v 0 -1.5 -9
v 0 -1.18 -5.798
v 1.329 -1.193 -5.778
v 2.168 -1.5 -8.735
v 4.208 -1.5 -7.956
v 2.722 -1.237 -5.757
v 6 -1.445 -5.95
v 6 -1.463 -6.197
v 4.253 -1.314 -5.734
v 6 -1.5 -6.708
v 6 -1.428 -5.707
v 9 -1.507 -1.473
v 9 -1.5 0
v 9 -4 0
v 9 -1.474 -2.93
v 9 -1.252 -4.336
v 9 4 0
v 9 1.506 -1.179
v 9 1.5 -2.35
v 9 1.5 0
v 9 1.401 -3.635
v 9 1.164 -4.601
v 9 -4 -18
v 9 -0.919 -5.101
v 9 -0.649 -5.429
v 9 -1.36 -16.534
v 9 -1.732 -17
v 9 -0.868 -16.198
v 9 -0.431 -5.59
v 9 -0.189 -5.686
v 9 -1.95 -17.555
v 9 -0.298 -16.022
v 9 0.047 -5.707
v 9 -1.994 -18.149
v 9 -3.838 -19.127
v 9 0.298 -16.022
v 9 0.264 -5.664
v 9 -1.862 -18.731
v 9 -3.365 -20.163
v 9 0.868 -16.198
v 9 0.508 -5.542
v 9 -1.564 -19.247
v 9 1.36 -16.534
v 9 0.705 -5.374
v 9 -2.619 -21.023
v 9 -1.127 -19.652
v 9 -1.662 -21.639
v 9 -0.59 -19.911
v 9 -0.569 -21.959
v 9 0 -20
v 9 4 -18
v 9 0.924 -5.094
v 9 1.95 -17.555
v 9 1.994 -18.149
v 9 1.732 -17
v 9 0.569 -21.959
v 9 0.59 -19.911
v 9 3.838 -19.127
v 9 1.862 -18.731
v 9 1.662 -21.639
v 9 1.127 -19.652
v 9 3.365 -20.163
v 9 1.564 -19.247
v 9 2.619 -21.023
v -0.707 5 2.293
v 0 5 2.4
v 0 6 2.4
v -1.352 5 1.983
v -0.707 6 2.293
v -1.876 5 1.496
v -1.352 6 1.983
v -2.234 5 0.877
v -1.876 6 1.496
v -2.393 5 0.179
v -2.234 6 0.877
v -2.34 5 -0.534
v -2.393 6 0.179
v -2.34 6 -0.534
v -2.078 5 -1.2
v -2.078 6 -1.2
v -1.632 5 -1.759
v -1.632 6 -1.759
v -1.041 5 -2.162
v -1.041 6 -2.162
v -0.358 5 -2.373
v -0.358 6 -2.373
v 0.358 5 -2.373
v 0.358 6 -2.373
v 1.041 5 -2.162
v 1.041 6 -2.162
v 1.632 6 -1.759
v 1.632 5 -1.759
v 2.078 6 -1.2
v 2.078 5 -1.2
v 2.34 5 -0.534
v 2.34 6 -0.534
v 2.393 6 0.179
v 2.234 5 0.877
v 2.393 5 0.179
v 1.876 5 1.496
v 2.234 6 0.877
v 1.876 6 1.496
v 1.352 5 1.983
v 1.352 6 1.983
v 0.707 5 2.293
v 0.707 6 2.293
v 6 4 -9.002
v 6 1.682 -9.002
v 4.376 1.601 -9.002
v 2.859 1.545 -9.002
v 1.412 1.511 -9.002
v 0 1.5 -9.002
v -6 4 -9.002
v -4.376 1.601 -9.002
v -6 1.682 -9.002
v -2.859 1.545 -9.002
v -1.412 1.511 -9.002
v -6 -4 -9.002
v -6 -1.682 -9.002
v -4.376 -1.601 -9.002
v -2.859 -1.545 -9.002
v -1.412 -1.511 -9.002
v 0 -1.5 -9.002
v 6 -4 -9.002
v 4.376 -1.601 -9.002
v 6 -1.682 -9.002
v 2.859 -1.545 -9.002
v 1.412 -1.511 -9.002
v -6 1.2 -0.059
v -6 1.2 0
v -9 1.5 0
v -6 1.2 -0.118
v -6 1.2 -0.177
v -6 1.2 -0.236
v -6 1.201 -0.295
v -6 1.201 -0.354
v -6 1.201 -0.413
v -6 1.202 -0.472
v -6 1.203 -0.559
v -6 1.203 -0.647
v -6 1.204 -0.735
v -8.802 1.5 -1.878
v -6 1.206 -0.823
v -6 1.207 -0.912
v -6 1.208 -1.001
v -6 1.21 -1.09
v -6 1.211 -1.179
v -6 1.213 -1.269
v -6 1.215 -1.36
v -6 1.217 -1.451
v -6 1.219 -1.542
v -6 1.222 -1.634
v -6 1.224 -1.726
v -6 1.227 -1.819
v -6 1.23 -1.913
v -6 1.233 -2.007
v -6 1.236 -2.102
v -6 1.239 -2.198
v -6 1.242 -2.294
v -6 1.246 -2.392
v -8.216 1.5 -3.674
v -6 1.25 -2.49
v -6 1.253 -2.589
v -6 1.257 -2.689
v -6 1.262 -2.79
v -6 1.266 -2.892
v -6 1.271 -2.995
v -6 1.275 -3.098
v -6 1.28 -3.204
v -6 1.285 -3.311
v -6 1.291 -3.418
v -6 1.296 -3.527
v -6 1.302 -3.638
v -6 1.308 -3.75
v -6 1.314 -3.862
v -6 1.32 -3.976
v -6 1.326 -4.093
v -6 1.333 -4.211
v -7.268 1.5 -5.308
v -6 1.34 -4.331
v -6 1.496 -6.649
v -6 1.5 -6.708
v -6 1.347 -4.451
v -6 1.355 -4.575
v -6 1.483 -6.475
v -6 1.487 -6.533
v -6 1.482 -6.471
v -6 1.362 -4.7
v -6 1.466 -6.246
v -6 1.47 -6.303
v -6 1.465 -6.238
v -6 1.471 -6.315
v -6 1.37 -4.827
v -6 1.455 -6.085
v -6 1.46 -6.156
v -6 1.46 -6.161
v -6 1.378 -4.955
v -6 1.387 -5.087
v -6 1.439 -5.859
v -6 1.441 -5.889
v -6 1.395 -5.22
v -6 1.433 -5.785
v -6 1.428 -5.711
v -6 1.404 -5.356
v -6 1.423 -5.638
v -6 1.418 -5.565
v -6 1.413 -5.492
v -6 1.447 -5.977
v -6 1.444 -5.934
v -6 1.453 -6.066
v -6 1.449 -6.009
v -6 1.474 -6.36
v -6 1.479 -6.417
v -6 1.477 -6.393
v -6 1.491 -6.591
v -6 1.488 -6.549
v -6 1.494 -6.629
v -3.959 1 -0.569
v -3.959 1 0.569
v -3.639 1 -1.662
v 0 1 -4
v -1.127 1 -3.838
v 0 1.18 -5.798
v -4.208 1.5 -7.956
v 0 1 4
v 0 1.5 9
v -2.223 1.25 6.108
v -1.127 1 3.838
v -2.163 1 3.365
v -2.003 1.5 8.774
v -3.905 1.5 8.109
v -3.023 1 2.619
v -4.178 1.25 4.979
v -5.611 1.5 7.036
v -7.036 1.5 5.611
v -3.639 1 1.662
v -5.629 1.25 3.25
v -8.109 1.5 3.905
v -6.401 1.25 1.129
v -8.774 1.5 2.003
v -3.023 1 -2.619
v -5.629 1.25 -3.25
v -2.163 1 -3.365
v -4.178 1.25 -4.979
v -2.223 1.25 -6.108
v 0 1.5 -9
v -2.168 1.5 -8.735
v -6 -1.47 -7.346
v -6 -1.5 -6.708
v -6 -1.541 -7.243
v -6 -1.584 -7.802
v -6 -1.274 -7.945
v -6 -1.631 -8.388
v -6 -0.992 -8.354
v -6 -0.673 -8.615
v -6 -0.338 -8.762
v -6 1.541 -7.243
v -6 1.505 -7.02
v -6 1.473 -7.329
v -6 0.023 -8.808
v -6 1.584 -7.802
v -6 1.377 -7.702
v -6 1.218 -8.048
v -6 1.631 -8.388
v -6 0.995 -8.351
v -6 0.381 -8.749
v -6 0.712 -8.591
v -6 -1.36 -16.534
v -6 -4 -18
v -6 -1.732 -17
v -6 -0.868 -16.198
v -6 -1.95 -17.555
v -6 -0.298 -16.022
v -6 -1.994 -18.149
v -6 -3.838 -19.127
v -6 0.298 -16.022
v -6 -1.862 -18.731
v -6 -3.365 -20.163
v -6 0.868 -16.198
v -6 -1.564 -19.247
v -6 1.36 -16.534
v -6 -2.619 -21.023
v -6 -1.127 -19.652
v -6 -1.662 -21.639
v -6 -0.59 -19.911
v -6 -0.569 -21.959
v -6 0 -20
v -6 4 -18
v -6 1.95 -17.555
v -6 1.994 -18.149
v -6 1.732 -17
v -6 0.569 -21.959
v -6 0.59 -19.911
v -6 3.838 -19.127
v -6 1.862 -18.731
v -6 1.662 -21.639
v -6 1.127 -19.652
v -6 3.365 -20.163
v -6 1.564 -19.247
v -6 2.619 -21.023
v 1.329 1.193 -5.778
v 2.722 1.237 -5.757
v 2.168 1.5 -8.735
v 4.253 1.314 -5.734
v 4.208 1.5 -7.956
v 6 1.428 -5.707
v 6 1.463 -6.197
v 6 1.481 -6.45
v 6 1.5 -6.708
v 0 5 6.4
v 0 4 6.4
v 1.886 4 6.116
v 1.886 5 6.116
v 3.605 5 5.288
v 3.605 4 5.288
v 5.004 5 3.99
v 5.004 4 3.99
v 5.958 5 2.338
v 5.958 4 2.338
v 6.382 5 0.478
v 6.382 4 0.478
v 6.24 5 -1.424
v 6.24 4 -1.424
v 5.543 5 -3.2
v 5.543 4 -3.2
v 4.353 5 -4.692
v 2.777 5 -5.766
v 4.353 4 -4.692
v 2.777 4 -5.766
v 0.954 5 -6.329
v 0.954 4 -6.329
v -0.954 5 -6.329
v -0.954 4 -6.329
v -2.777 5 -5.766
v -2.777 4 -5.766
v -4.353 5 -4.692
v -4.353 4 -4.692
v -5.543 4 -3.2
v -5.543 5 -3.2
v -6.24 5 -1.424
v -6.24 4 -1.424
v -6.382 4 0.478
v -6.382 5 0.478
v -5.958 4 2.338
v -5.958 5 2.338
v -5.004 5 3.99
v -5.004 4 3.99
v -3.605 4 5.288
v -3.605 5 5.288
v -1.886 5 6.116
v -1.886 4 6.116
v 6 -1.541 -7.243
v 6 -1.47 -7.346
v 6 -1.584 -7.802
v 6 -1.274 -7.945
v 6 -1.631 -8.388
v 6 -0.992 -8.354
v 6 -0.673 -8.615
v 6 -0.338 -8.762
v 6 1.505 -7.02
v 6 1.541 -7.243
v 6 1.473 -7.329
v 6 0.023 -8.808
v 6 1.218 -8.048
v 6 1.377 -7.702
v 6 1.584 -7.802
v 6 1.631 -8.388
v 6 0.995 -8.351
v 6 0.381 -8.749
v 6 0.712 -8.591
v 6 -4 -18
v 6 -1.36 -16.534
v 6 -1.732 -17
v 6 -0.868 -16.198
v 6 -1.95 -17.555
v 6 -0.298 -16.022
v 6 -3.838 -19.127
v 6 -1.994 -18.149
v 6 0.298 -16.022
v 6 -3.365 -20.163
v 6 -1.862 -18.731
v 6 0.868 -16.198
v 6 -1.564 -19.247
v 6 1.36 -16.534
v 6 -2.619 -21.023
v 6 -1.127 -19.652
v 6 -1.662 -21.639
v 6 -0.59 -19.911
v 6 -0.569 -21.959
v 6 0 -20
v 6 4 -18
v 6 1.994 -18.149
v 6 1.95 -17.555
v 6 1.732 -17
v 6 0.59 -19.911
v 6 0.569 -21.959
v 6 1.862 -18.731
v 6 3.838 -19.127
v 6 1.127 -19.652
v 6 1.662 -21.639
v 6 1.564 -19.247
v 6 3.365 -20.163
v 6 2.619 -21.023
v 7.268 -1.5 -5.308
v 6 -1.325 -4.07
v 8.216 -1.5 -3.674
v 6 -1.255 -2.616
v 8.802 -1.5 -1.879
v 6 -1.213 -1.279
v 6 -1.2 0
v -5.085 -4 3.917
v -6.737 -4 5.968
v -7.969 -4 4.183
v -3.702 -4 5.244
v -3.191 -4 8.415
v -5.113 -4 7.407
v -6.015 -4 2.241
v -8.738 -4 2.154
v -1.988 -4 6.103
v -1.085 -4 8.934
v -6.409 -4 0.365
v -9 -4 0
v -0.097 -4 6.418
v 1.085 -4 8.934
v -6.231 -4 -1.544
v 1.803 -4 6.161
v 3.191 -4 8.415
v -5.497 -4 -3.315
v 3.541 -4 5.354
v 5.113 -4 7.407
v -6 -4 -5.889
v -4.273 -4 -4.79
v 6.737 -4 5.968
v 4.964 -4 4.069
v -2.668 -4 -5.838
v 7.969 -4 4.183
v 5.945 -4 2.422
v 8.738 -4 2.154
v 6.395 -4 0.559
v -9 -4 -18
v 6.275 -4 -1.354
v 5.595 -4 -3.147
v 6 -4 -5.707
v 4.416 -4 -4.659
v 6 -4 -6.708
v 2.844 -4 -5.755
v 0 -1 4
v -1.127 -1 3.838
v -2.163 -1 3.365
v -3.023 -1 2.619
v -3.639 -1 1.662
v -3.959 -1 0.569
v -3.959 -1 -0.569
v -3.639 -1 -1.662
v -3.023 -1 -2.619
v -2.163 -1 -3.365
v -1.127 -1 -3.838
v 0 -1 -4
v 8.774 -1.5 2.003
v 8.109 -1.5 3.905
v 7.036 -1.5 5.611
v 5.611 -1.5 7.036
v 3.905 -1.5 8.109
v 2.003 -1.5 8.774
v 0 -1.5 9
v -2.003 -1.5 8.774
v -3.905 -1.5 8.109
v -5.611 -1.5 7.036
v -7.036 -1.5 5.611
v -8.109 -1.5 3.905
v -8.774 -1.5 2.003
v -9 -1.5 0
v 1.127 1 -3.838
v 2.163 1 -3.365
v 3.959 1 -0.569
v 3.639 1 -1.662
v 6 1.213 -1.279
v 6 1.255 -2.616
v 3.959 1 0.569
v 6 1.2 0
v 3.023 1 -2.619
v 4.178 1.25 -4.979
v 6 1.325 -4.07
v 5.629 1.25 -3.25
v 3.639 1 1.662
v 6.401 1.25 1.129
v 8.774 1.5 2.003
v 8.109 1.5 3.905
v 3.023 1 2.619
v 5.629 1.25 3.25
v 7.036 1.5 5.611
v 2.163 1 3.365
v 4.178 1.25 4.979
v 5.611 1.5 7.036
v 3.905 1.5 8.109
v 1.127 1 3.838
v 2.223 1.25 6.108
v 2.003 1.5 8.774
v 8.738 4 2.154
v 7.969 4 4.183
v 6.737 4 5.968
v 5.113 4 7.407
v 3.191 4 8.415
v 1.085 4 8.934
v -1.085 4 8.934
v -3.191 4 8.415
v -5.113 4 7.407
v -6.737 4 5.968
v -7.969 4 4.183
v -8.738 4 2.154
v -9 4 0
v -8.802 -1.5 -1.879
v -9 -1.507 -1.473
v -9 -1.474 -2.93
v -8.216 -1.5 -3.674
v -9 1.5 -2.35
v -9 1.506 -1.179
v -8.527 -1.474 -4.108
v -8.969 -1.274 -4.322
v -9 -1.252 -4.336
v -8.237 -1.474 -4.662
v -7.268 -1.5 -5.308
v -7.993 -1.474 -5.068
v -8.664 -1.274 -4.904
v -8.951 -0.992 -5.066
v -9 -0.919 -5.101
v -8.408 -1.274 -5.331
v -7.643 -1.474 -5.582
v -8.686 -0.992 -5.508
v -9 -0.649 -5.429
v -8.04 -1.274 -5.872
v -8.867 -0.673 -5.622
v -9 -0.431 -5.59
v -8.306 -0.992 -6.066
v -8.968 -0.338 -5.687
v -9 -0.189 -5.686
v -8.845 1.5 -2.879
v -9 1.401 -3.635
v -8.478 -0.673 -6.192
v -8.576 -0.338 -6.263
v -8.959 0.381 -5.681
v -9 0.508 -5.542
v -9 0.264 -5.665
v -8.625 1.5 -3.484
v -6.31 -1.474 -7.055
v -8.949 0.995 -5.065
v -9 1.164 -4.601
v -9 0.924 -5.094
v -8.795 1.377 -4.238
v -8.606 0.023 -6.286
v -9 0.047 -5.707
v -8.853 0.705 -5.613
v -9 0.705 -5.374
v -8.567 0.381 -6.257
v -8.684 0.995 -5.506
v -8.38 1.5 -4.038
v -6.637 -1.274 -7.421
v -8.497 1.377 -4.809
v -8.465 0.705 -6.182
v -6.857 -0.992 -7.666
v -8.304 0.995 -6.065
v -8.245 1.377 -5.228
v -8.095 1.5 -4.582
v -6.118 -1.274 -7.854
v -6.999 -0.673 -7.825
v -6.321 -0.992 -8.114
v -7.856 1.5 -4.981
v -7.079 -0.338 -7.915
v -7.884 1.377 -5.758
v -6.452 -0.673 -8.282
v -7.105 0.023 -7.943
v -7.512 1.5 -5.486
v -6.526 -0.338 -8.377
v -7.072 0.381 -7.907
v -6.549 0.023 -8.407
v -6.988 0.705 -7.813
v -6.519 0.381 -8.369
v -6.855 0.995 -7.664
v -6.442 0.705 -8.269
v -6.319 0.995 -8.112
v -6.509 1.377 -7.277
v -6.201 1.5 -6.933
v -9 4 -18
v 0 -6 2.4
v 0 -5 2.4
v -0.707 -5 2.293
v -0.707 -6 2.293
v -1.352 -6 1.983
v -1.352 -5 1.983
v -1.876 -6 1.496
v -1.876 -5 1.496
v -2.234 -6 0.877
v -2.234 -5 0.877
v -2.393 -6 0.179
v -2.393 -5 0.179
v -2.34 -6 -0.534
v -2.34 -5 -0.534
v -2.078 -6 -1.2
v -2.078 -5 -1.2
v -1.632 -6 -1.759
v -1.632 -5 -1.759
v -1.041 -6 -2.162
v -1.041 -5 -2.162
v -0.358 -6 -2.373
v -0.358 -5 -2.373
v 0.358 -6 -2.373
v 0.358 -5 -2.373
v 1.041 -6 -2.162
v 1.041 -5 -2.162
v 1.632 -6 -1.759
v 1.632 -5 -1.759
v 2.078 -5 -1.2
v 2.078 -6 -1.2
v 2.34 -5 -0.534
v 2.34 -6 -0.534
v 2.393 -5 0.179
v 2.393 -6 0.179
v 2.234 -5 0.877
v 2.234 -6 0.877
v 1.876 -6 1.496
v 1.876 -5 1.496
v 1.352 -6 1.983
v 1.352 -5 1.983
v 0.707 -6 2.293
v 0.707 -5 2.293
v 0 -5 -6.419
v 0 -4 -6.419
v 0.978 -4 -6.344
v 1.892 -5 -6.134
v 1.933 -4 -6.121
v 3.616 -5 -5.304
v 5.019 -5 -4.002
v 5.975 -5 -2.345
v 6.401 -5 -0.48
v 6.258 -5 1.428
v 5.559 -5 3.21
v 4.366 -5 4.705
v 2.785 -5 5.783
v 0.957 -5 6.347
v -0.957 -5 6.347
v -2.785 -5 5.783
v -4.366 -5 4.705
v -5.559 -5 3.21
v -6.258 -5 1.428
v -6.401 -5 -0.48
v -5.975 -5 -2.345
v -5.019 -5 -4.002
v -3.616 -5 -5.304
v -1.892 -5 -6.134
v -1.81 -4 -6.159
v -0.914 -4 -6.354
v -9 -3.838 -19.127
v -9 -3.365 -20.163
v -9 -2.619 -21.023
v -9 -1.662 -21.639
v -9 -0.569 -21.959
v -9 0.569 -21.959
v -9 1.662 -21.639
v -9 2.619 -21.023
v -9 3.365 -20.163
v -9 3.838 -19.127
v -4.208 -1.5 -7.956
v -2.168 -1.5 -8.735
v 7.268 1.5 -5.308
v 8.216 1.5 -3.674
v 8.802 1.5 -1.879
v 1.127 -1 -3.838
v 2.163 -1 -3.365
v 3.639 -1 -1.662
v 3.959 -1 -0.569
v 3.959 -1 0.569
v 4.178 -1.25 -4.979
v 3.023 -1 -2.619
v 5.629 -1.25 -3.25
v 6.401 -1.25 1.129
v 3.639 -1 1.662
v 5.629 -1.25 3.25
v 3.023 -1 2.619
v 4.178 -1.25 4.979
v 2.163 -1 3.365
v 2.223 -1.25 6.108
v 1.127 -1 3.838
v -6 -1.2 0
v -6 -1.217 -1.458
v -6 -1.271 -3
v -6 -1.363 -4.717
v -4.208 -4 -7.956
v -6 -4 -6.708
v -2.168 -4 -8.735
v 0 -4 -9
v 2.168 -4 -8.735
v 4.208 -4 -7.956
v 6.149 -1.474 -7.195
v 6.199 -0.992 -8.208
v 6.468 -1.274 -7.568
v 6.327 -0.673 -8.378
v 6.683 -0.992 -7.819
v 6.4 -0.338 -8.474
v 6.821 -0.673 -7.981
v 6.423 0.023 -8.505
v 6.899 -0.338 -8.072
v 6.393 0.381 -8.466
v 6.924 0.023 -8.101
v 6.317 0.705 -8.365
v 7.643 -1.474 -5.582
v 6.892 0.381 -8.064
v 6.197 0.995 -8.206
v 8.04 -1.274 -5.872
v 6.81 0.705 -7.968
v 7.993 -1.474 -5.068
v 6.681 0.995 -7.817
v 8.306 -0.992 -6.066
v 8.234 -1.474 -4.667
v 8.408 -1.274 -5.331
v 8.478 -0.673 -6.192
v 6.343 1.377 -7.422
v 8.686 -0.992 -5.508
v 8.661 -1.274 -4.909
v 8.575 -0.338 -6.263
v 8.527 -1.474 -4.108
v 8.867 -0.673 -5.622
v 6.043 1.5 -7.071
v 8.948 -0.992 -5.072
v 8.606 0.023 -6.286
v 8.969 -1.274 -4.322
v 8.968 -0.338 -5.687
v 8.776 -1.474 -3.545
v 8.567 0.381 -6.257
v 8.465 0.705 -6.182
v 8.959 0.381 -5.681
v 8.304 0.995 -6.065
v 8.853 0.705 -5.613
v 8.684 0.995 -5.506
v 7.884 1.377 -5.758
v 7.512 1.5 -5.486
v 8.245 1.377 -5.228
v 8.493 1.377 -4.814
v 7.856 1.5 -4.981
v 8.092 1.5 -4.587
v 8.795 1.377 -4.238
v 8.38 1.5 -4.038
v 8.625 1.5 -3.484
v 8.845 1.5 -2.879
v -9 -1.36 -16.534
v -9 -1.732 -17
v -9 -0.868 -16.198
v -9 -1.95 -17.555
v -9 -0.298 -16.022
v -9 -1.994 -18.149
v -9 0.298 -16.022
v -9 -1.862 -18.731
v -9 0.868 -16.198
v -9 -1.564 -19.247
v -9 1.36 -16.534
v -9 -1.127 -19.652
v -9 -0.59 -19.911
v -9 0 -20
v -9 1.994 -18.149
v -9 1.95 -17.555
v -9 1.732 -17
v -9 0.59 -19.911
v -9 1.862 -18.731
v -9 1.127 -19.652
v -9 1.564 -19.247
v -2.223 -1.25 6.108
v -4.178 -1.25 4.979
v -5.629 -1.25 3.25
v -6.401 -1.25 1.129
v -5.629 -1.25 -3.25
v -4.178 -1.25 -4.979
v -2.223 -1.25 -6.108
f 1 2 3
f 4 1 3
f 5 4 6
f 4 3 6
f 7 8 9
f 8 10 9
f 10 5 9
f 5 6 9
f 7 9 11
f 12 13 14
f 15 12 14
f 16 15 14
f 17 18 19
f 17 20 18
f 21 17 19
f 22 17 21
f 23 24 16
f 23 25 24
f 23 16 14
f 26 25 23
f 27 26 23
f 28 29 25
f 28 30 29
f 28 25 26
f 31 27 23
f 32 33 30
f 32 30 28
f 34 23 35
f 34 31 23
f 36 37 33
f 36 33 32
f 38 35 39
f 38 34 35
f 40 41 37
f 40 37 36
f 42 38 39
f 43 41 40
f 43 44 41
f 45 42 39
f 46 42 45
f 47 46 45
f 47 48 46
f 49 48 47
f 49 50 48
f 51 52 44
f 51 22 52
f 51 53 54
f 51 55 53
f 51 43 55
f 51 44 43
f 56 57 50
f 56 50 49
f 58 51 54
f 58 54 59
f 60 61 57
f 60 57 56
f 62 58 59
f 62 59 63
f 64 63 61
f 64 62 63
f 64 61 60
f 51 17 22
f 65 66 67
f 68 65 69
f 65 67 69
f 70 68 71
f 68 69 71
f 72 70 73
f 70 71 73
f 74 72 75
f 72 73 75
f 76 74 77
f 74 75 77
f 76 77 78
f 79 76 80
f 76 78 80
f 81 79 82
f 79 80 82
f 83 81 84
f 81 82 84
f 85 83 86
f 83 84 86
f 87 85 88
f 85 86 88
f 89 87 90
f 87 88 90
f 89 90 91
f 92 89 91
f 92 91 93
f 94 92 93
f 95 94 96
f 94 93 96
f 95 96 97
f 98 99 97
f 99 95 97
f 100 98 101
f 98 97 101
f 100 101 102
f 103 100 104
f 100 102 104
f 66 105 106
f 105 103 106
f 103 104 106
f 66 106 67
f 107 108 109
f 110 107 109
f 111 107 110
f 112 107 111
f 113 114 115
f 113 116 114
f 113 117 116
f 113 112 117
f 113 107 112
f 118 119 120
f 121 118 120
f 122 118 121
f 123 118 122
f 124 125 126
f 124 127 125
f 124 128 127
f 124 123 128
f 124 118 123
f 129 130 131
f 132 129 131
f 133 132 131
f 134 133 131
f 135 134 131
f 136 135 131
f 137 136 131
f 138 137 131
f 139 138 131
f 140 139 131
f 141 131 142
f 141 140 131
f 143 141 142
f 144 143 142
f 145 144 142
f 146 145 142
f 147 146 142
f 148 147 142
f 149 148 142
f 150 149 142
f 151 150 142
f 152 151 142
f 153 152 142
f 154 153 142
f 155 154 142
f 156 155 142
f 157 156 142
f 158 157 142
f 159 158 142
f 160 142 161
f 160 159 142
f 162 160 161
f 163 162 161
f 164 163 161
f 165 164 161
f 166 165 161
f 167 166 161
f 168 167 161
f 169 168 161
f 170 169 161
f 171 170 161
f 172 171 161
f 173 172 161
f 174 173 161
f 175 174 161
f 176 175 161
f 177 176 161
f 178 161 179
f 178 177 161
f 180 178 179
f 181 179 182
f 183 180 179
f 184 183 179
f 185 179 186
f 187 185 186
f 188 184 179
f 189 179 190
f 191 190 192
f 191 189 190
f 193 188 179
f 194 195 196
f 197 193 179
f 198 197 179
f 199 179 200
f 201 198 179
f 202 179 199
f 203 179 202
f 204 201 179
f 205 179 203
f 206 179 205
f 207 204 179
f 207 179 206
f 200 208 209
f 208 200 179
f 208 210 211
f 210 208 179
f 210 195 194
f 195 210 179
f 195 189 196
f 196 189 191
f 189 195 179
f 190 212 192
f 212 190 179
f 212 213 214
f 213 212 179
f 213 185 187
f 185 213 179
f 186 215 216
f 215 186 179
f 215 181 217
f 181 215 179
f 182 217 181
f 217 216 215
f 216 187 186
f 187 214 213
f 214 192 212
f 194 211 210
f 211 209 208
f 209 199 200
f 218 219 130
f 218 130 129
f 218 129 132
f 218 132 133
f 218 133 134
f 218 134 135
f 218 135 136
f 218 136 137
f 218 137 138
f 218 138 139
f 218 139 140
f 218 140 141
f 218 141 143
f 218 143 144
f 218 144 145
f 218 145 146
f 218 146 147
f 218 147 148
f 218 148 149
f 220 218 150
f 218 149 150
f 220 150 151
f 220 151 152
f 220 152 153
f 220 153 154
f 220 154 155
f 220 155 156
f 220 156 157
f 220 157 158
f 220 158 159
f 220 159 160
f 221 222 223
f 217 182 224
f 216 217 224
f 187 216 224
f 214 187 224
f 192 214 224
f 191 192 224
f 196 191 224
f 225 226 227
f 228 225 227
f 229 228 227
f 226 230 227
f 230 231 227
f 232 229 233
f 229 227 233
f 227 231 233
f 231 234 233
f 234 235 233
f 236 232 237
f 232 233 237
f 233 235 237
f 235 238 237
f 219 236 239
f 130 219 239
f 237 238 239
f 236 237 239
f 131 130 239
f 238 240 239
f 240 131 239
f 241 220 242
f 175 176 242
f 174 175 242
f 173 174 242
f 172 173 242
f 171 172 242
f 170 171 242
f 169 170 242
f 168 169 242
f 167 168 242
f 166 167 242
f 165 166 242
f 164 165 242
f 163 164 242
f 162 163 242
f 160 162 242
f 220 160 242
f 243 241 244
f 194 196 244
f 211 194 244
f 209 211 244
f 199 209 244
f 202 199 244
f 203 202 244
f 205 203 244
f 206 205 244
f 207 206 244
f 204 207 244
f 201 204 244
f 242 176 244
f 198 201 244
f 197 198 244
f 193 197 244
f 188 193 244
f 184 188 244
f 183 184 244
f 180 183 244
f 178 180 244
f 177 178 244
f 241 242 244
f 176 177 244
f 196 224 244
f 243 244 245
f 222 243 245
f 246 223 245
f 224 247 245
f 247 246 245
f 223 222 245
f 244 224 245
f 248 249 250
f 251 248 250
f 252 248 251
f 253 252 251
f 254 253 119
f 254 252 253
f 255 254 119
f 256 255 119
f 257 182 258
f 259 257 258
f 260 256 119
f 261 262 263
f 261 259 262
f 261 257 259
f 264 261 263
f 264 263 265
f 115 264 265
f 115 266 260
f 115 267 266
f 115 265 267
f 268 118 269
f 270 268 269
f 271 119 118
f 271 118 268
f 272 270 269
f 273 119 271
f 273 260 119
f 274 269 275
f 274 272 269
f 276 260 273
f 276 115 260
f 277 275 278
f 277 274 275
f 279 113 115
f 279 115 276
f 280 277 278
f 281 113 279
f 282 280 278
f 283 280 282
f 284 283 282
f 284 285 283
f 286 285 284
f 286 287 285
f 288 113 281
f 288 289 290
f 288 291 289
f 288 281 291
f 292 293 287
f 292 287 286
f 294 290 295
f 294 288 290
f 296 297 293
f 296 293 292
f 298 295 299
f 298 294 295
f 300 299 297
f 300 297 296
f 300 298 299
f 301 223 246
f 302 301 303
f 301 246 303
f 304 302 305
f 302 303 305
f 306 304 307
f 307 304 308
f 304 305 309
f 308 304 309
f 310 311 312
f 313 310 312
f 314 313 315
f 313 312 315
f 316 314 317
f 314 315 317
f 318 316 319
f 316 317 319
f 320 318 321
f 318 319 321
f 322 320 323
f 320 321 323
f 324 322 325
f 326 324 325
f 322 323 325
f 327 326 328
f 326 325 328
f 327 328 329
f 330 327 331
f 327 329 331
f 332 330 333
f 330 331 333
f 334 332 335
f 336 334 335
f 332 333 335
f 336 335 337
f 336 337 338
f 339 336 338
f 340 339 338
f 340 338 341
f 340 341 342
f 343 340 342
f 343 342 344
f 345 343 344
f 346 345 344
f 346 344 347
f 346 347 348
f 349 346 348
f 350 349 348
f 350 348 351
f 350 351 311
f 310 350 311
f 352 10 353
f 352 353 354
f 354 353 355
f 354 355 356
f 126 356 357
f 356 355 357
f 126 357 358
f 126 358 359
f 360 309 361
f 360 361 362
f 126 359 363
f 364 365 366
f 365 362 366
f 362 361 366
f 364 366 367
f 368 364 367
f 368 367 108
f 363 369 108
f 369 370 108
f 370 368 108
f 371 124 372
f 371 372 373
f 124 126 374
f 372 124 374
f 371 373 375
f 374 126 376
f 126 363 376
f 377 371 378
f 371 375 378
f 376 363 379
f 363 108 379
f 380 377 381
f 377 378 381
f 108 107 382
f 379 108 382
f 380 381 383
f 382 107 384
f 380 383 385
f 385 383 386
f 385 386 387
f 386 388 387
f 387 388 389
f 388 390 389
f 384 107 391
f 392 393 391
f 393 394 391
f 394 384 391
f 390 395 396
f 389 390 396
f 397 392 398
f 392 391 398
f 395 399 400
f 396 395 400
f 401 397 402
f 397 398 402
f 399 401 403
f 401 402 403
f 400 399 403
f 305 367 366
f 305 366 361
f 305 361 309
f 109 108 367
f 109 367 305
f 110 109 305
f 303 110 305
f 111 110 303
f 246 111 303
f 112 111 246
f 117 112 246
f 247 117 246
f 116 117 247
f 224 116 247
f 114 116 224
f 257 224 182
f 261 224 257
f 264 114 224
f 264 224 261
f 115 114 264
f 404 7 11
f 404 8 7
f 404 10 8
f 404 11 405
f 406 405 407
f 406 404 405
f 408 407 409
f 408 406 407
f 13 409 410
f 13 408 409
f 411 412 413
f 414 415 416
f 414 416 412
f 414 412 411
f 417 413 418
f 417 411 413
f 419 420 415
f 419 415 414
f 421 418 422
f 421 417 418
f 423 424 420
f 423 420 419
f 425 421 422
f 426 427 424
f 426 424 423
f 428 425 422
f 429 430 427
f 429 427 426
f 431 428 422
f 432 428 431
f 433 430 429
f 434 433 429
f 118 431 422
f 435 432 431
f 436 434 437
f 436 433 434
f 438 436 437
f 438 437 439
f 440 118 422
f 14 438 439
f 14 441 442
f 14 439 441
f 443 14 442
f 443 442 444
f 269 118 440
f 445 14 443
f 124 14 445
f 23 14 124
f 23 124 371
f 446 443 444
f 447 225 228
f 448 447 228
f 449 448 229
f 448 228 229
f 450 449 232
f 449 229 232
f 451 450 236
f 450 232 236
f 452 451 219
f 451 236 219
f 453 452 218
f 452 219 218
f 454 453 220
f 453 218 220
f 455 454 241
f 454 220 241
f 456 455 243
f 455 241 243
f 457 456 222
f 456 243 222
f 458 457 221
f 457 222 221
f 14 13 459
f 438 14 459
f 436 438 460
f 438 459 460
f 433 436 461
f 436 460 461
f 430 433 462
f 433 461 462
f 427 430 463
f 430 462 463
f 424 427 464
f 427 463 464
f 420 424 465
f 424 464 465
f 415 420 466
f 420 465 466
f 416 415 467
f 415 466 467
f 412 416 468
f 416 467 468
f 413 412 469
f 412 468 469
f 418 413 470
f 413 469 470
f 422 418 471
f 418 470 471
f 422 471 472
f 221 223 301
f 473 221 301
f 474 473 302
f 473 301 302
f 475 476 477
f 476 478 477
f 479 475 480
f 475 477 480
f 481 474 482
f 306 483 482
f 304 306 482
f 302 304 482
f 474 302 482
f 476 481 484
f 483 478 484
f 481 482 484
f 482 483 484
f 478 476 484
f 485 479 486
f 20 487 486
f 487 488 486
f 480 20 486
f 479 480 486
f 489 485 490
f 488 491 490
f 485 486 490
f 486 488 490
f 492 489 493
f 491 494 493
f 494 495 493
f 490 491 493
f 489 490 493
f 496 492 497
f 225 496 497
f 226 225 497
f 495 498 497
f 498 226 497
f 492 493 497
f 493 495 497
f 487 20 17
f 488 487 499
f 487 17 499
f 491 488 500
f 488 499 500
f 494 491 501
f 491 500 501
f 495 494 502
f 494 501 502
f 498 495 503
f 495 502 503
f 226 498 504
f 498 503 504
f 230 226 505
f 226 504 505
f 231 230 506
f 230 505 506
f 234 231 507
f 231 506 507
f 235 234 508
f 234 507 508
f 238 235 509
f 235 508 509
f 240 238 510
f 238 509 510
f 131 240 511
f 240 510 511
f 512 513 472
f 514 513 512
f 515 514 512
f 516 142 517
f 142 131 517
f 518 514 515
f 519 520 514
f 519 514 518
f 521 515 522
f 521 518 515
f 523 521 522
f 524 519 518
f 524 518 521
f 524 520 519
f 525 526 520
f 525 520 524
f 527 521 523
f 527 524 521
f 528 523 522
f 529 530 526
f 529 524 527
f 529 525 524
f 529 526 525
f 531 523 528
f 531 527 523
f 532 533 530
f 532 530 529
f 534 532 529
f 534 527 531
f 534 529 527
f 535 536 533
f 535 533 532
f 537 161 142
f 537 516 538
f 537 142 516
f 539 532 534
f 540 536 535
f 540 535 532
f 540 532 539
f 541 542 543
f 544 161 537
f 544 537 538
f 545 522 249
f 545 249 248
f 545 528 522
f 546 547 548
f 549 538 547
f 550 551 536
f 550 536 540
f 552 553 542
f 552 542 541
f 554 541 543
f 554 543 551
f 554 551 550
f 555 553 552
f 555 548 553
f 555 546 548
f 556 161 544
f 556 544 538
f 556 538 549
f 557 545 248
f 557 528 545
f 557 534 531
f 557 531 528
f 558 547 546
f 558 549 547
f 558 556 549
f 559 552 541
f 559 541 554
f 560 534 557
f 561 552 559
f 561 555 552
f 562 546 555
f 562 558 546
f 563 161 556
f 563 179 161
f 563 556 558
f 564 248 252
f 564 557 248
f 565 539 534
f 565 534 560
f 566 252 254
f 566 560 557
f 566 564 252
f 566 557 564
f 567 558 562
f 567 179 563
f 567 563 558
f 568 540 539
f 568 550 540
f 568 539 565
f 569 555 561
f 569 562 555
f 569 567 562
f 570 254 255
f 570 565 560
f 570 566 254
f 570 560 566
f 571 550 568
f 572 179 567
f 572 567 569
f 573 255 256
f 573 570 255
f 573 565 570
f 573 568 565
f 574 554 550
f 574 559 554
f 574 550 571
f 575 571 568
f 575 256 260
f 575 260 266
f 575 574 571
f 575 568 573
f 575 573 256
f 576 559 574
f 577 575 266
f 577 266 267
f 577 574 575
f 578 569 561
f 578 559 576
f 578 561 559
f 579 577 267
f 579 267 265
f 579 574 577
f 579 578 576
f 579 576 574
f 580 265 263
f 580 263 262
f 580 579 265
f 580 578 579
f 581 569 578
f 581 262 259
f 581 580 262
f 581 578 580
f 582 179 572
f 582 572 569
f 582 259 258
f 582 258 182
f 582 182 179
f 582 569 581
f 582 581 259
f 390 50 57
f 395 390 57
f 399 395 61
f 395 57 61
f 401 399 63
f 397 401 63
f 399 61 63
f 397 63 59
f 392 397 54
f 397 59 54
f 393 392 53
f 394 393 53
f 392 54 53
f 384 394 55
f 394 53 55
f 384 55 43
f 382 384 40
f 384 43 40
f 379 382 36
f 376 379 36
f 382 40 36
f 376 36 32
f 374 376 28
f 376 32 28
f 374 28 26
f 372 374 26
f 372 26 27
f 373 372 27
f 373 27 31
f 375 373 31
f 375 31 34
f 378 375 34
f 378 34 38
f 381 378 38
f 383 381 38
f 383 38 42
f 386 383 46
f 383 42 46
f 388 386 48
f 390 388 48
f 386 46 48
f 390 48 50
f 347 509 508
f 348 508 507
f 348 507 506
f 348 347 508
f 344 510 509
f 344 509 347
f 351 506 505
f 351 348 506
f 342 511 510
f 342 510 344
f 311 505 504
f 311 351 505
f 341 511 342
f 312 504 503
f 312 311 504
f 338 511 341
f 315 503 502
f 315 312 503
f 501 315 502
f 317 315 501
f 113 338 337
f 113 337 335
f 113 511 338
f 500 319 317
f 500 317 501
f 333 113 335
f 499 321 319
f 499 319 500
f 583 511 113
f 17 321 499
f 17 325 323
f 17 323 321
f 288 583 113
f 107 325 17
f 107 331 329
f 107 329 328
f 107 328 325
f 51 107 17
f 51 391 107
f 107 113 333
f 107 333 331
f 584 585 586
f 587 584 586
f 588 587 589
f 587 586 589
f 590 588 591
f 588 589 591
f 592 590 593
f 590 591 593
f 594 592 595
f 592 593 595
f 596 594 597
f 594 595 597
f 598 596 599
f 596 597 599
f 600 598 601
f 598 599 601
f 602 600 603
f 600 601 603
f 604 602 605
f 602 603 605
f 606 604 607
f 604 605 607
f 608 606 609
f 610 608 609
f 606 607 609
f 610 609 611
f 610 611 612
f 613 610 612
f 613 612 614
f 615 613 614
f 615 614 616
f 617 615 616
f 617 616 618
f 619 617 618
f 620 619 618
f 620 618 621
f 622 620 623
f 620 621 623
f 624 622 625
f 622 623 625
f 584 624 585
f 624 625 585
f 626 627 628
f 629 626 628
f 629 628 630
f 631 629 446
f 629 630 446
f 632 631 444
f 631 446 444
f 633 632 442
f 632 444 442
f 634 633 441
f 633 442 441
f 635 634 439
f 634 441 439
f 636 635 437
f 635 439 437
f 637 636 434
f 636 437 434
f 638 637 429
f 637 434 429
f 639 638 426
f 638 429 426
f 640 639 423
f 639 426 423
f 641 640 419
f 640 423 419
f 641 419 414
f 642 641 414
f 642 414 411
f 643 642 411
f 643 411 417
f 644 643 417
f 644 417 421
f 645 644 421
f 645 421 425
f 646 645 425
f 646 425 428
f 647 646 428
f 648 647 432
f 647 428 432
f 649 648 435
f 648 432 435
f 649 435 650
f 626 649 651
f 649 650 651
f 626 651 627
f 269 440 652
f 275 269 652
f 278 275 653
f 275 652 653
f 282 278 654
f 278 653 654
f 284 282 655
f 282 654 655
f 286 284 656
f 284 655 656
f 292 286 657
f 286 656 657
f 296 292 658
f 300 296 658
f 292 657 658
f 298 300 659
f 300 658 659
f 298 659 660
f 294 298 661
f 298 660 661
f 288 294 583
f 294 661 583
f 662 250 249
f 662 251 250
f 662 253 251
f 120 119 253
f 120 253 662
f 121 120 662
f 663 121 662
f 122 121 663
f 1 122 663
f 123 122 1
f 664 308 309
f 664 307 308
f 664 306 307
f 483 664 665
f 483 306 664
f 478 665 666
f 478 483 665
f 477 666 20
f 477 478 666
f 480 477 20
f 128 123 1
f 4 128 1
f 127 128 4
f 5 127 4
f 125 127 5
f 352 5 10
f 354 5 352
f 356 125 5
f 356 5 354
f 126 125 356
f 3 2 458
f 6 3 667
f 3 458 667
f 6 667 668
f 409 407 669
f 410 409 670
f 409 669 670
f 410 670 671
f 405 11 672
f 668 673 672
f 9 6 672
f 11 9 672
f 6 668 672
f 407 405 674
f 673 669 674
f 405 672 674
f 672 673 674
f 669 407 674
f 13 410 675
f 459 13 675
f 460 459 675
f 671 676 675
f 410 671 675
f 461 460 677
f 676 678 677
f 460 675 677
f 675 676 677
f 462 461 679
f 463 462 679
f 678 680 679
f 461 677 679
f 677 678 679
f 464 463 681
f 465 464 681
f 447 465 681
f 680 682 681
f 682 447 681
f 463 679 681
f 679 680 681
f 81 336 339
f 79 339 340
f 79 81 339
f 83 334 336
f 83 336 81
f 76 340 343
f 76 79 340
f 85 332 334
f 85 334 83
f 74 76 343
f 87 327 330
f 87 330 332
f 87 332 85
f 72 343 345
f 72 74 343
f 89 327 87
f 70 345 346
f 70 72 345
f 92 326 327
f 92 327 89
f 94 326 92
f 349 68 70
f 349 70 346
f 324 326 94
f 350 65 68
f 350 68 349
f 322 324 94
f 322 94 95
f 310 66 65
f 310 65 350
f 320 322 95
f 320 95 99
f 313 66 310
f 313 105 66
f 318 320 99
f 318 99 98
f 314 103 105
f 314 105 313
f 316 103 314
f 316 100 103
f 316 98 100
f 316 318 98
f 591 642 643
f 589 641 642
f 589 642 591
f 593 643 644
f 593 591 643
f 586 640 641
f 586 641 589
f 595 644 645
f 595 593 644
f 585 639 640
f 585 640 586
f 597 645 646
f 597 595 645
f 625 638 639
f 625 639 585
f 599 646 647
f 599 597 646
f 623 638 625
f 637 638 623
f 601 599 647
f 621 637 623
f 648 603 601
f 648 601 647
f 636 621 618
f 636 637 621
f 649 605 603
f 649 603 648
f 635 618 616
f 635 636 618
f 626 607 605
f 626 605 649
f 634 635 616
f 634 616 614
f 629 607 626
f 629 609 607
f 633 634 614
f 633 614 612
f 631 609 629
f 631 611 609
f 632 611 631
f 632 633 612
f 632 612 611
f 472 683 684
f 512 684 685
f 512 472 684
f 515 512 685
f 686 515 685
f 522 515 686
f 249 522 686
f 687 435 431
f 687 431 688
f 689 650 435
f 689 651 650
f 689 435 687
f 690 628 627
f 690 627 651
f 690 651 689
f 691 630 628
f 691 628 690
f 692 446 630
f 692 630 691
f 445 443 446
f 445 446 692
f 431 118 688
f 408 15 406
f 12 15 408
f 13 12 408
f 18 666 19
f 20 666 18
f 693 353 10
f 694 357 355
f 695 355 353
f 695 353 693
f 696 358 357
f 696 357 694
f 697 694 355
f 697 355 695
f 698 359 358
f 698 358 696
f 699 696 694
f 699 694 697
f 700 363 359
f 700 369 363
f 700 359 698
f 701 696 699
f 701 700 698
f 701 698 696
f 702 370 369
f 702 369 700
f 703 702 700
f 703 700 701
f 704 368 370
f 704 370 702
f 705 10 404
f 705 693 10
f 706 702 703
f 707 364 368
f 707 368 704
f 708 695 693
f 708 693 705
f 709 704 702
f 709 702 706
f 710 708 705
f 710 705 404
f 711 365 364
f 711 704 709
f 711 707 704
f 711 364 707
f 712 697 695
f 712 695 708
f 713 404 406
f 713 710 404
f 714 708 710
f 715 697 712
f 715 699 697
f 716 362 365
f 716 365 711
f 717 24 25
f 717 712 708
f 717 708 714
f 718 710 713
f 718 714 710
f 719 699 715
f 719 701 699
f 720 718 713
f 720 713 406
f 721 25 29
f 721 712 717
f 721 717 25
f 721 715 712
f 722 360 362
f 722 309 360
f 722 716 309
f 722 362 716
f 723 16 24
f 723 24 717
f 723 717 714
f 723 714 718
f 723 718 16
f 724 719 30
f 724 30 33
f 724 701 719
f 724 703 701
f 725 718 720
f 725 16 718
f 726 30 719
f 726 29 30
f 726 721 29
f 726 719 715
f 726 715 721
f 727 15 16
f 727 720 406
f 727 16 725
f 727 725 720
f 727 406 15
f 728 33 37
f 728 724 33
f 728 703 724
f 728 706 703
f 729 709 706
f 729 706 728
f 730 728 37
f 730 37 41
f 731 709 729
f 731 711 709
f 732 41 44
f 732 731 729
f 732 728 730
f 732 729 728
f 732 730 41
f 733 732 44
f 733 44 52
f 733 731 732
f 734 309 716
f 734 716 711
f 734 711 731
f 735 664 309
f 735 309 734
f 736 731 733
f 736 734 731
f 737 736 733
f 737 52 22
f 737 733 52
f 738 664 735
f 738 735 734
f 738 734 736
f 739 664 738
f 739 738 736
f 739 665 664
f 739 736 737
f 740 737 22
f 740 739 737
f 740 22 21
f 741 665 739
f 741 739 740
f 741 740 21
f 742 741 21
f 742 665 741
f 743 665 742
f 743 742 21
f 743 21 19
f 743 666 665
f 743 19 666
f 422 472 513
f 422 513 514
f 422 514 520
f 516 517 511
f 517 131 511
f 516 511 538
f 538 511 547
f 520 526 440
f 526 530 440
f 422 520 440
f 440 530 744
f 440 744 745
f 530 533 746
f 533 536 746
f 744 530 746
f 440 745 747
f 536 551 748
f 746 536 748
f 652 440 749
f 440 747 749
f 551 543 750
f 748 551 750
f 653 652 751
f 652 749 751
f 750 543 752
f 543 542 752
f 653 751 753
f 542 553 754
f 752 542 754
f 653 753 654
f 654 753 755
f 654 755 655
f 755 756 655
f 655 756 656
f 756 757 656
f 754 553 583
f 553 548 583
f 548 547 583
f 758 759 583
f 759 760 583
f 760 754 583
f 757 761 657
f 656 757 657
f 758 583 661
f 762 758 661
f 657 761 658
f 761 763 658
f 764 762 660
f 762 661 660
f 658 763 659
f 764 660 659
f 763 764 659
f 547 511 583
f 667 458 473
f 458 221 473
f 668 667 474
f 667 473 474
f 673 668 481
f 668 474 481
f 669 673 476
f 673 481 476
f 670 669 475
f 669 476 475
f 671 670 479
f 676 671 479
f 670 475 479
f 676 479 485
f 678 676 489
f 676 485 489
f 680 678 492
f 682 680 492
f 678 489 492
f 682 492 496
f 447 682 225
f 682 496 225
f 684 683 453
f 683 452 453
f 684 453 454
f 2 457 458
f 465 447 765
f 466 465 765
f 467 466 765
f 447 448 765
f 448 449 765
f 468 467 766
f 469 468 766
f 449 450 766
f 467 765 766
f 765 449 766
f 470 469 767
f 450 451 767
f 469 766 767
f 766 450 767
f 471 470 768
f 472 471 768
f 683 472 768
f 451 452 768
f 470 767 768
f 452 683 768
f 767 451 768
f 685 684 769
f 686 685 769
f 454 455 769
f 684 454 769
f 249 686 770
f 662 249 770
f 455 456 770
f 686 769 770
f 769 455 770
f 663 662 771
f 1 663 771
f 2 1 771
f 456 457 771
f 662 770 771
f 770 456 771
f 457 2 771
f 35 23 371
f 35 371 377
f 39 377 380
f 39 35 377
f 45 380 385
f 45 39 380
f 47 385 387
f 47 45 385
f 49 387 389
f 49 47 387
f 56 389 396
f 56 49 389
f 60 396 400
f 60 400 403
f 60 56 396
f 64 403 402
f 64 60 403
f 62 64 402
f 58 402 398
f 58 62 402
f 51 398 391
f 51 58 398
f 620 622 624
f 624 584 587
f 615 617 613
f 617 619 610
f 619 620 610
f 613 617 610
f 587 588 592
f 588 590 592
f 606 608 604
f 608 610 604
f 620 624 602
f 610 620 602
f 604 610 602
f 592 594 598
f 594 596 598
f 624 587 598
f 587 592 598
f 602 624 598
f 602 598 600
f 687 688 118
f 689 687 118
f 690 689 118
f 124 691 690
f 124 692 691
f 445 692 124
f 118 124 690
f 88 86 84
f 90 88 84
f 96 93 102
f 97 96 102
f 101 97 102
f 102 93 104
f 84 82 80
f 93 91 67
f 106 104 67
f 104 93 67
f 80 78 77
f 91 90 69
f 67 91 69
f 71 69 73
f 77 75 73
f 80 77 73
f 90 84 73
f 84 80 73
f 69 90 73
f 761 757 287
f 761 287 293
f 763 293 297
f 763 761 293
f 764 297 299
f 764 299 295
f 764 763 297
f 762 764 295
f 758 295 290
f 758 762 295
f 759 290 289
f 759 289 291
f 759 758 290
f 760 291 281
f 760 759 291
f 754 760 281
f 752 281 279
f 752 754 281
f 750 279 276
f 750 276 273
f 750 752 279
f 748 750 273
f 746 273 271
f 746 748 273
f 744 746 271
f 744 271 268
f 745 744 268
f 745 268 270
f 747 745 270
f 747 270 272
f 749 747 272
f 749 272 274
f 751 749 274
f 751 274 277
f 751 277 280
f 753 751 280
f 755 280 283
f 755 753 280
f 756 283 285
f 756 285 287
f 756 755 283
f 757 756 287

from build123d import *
from build123d.topology import SkipClean

# Parameters (mm, degrees)
SKETCH4_R            = 6.4
SKETCH4_R_2          = 2
BOSS_EXTRUDE3_DEPTH  = 1
BOSS_EXTRUDE6_START  = -3
SKETCH5_R            = 2
BOSS_EXTRUDE6_DEPTH  = 3.0001
BOSS_EXTRUDE22_REACH = 27.788
SKETCH9_R            = 6.419042014
BOSS_EXTRUDE9_DEPTH  = 1
BOSS_EXTRUDE23_REACH = 27.788


with BuildPart() as part:
    # Sketch3 → Revolve1 (revolve)
    with BuildSketch(Plane(origin=(0, 0, 0), x_dir=(0, 0, -1), z_dir=(1, 0, 0))):
        Polygon((-9, -1.5), (-4, -1), (-4, 1), (-9, 1.5), (-9, 4), (-2.4, 4), (-2.4, 6), (0, 6), (0, -6), (-2.4, -6), (-2.4, -4), (-9, -4), align=None)
    revolve(axis=Axis((0, 6, 0), (0, -1, 0)))



with BuildPart() as body_2:
    # Sketch4 → Boss-Extrude3 (new body)
    with BuildSketch(Plane(origin=(0, 4, 0), x_dir=(1, 0, 0), z_dir=(0, 1, 0))):
        with Locations(Location((0, 0, 0), (0, 0, 270))):
            Circle(SKETCH4_R)
        with Locations(Location((0, 0, 0), (0, 0, 270))):
            Circle(SKETCH4_R_2, mode=Mode.SUBTRACT)
    extrude(amount=BOSS_EXTRUDE3_DEPTH)


with BuildPart() as part_1:
    add(part.part)

    add(body_2.part)  # Boss-Extrude6 merges body 2
    # Sketch5 → Boss-Extrude6 (add)
    with BuildSketch(Plane(origin=(-6, 0, 3.854187267), x_dir=(0, 0, -1), z_dir=(1, 0, 0)).offset(BOSS_EXTRUDE6_START)):
        with BuildLine():
            ThreePointArc((21.854187267, -4), (25.854187267, 0), (21.854187267, 4))
            Line((21.854187267, 4), (3.854187267, 4))
            Line((3.854187267, 4), (3.854187267, -4))
            Line((3.854187267, -4), (21.854187267, -4))
        make_face()
        with Locations((21.854187267, 0)):
            Circle(SKETCH5_R, mode=Mode.SUBTRACT)
    boss_extrude6 = extrude(amount=BOSS_EXTRUDE6_DEPTH)

    # Mirror1: Boss-Extrude6 across plane
    add(boss_extrude6.mirror(Plane(origin=(0, 0, 0), x_dir=(0, 0, 1), z_dir=(1, 0, 0))))

    # Boss-Extrude22: up to this cone (the profile starts inside it)
    with SkipClean():  # the faces are left unmerged after this step: merging them gives an invalid solid
        boss_extrude22_end = Plane(origin=(0, -4, 0), z_dir=(0, -1, 0)).offset(-3.399999) * Cone(1e-05, 656.88, 65.687999, align=(Align.CENTER, Align.CENTER, Align.MIN), mode=Mode.PRIVATE)
        # Sketch18 → Boss-Extrude22 (add, up to the surface)
        with BuildSketch(Plane.XZ.offset(4), mode=Mode.PRIVATE) as boss_extrude22_sk1:
            Polygon((-6, -9.001972309), (5.9999, -9.001972309), (5.9999, -5.707140078), (-6, -5.888545051), align=None)
        boss_extrude22_tool1 = extrude(boss_extrude22_sk1.sketch, amount=-BOSS_EXTRUDE22_REACH, mode=Mode.PRIVATE) & boss_extrude22_end
        add(boss_extrude22_tool1.solids().sort_by_distance((0.056566, -4, -7.39948))[0])

    # Sketch9 → Boss-Extrude9 (add)
    with SkipClean():  # the faces are left unmerged after this step: merging them gives an invalid solid
        with BuildSketch(Plane(origin=(0, -4, 0), x_dir=(-1, 0, 0), z_dir=(0, -1, 0))):
            with Locations(Location((0, 0, 0), (0, 0, 90))):
                Circle(SKETCH9_R)
        extrude(amount=BOSS_EXTRUDE9_DEPTH)

    # Sketch11 → Cut-Revolve3 (revolve, cut)
    with SkipClean():  # the faces are left unmerged after this step: merging them gives an invalid solid
        with BuildSketch(Plane(origin=(0, 0, 0), x_dir=(0, 0, -1), z_dir=(1, 0, 0)), mode=Mode.PRIVATE) as cut_revolve3_sk:
            with BuildLine():
                ThreePointArc((-9, -1.5), (-10.657481343, 0), (-9, 1.5))
                Line((-9, 1.5), (-4, 1))
                Line((-4, 1), (-4, -1))
                Line((-4, -1), (-9, -1.5))
            make_face()
        revolve(cut_revolve3_sk.sketch.rotate(Axis((0, 6, 0), (0, -1, 0)), 180), axis=Axis((0, 6, 0), (0, -1, 0)), mode=Mode.SUBTRACT)

    # Boss-Extrude23: up to this cone (the profile starts inside it)
    boss_extrude23_end = Plane(origin=(0, 4, 0), z_dir=(0, 1, 0)).offset(-3.399999) * Cone(1e-05, 656.88, 65.687999, align=(Align.CENTER, Align.CENTER, Align.MIN), mode=Mode.PRIVATE)
    # Sketch22 → Boss-Extrude23 (add, up to the surface)
    with BuildSketch(Plane(origin=(0, 4, 0), x_dir=(1, 0, 0), z_dir=(0, 1, 0)), mode=Mode.PRIVATE) as boss_extrude23_sk1:
        Polygon((5.9999, 9.001972309), (-6, 9.001972309), (-6, 5.888545051), (5.9999, 5.707140078), align=None)
    boss_extrude23_tool1 = extrude(boss_extrude23_sk1.sketch, amount=-BOSS_EXTRUDE23_REACH, mode=Mode.PRIVATE) & boss_extrude23_end
    add(boss_extrude23_tool1.solids().sort_by_distance((0.056566, 4, -7.39948))[0])


solid = part_1.part
